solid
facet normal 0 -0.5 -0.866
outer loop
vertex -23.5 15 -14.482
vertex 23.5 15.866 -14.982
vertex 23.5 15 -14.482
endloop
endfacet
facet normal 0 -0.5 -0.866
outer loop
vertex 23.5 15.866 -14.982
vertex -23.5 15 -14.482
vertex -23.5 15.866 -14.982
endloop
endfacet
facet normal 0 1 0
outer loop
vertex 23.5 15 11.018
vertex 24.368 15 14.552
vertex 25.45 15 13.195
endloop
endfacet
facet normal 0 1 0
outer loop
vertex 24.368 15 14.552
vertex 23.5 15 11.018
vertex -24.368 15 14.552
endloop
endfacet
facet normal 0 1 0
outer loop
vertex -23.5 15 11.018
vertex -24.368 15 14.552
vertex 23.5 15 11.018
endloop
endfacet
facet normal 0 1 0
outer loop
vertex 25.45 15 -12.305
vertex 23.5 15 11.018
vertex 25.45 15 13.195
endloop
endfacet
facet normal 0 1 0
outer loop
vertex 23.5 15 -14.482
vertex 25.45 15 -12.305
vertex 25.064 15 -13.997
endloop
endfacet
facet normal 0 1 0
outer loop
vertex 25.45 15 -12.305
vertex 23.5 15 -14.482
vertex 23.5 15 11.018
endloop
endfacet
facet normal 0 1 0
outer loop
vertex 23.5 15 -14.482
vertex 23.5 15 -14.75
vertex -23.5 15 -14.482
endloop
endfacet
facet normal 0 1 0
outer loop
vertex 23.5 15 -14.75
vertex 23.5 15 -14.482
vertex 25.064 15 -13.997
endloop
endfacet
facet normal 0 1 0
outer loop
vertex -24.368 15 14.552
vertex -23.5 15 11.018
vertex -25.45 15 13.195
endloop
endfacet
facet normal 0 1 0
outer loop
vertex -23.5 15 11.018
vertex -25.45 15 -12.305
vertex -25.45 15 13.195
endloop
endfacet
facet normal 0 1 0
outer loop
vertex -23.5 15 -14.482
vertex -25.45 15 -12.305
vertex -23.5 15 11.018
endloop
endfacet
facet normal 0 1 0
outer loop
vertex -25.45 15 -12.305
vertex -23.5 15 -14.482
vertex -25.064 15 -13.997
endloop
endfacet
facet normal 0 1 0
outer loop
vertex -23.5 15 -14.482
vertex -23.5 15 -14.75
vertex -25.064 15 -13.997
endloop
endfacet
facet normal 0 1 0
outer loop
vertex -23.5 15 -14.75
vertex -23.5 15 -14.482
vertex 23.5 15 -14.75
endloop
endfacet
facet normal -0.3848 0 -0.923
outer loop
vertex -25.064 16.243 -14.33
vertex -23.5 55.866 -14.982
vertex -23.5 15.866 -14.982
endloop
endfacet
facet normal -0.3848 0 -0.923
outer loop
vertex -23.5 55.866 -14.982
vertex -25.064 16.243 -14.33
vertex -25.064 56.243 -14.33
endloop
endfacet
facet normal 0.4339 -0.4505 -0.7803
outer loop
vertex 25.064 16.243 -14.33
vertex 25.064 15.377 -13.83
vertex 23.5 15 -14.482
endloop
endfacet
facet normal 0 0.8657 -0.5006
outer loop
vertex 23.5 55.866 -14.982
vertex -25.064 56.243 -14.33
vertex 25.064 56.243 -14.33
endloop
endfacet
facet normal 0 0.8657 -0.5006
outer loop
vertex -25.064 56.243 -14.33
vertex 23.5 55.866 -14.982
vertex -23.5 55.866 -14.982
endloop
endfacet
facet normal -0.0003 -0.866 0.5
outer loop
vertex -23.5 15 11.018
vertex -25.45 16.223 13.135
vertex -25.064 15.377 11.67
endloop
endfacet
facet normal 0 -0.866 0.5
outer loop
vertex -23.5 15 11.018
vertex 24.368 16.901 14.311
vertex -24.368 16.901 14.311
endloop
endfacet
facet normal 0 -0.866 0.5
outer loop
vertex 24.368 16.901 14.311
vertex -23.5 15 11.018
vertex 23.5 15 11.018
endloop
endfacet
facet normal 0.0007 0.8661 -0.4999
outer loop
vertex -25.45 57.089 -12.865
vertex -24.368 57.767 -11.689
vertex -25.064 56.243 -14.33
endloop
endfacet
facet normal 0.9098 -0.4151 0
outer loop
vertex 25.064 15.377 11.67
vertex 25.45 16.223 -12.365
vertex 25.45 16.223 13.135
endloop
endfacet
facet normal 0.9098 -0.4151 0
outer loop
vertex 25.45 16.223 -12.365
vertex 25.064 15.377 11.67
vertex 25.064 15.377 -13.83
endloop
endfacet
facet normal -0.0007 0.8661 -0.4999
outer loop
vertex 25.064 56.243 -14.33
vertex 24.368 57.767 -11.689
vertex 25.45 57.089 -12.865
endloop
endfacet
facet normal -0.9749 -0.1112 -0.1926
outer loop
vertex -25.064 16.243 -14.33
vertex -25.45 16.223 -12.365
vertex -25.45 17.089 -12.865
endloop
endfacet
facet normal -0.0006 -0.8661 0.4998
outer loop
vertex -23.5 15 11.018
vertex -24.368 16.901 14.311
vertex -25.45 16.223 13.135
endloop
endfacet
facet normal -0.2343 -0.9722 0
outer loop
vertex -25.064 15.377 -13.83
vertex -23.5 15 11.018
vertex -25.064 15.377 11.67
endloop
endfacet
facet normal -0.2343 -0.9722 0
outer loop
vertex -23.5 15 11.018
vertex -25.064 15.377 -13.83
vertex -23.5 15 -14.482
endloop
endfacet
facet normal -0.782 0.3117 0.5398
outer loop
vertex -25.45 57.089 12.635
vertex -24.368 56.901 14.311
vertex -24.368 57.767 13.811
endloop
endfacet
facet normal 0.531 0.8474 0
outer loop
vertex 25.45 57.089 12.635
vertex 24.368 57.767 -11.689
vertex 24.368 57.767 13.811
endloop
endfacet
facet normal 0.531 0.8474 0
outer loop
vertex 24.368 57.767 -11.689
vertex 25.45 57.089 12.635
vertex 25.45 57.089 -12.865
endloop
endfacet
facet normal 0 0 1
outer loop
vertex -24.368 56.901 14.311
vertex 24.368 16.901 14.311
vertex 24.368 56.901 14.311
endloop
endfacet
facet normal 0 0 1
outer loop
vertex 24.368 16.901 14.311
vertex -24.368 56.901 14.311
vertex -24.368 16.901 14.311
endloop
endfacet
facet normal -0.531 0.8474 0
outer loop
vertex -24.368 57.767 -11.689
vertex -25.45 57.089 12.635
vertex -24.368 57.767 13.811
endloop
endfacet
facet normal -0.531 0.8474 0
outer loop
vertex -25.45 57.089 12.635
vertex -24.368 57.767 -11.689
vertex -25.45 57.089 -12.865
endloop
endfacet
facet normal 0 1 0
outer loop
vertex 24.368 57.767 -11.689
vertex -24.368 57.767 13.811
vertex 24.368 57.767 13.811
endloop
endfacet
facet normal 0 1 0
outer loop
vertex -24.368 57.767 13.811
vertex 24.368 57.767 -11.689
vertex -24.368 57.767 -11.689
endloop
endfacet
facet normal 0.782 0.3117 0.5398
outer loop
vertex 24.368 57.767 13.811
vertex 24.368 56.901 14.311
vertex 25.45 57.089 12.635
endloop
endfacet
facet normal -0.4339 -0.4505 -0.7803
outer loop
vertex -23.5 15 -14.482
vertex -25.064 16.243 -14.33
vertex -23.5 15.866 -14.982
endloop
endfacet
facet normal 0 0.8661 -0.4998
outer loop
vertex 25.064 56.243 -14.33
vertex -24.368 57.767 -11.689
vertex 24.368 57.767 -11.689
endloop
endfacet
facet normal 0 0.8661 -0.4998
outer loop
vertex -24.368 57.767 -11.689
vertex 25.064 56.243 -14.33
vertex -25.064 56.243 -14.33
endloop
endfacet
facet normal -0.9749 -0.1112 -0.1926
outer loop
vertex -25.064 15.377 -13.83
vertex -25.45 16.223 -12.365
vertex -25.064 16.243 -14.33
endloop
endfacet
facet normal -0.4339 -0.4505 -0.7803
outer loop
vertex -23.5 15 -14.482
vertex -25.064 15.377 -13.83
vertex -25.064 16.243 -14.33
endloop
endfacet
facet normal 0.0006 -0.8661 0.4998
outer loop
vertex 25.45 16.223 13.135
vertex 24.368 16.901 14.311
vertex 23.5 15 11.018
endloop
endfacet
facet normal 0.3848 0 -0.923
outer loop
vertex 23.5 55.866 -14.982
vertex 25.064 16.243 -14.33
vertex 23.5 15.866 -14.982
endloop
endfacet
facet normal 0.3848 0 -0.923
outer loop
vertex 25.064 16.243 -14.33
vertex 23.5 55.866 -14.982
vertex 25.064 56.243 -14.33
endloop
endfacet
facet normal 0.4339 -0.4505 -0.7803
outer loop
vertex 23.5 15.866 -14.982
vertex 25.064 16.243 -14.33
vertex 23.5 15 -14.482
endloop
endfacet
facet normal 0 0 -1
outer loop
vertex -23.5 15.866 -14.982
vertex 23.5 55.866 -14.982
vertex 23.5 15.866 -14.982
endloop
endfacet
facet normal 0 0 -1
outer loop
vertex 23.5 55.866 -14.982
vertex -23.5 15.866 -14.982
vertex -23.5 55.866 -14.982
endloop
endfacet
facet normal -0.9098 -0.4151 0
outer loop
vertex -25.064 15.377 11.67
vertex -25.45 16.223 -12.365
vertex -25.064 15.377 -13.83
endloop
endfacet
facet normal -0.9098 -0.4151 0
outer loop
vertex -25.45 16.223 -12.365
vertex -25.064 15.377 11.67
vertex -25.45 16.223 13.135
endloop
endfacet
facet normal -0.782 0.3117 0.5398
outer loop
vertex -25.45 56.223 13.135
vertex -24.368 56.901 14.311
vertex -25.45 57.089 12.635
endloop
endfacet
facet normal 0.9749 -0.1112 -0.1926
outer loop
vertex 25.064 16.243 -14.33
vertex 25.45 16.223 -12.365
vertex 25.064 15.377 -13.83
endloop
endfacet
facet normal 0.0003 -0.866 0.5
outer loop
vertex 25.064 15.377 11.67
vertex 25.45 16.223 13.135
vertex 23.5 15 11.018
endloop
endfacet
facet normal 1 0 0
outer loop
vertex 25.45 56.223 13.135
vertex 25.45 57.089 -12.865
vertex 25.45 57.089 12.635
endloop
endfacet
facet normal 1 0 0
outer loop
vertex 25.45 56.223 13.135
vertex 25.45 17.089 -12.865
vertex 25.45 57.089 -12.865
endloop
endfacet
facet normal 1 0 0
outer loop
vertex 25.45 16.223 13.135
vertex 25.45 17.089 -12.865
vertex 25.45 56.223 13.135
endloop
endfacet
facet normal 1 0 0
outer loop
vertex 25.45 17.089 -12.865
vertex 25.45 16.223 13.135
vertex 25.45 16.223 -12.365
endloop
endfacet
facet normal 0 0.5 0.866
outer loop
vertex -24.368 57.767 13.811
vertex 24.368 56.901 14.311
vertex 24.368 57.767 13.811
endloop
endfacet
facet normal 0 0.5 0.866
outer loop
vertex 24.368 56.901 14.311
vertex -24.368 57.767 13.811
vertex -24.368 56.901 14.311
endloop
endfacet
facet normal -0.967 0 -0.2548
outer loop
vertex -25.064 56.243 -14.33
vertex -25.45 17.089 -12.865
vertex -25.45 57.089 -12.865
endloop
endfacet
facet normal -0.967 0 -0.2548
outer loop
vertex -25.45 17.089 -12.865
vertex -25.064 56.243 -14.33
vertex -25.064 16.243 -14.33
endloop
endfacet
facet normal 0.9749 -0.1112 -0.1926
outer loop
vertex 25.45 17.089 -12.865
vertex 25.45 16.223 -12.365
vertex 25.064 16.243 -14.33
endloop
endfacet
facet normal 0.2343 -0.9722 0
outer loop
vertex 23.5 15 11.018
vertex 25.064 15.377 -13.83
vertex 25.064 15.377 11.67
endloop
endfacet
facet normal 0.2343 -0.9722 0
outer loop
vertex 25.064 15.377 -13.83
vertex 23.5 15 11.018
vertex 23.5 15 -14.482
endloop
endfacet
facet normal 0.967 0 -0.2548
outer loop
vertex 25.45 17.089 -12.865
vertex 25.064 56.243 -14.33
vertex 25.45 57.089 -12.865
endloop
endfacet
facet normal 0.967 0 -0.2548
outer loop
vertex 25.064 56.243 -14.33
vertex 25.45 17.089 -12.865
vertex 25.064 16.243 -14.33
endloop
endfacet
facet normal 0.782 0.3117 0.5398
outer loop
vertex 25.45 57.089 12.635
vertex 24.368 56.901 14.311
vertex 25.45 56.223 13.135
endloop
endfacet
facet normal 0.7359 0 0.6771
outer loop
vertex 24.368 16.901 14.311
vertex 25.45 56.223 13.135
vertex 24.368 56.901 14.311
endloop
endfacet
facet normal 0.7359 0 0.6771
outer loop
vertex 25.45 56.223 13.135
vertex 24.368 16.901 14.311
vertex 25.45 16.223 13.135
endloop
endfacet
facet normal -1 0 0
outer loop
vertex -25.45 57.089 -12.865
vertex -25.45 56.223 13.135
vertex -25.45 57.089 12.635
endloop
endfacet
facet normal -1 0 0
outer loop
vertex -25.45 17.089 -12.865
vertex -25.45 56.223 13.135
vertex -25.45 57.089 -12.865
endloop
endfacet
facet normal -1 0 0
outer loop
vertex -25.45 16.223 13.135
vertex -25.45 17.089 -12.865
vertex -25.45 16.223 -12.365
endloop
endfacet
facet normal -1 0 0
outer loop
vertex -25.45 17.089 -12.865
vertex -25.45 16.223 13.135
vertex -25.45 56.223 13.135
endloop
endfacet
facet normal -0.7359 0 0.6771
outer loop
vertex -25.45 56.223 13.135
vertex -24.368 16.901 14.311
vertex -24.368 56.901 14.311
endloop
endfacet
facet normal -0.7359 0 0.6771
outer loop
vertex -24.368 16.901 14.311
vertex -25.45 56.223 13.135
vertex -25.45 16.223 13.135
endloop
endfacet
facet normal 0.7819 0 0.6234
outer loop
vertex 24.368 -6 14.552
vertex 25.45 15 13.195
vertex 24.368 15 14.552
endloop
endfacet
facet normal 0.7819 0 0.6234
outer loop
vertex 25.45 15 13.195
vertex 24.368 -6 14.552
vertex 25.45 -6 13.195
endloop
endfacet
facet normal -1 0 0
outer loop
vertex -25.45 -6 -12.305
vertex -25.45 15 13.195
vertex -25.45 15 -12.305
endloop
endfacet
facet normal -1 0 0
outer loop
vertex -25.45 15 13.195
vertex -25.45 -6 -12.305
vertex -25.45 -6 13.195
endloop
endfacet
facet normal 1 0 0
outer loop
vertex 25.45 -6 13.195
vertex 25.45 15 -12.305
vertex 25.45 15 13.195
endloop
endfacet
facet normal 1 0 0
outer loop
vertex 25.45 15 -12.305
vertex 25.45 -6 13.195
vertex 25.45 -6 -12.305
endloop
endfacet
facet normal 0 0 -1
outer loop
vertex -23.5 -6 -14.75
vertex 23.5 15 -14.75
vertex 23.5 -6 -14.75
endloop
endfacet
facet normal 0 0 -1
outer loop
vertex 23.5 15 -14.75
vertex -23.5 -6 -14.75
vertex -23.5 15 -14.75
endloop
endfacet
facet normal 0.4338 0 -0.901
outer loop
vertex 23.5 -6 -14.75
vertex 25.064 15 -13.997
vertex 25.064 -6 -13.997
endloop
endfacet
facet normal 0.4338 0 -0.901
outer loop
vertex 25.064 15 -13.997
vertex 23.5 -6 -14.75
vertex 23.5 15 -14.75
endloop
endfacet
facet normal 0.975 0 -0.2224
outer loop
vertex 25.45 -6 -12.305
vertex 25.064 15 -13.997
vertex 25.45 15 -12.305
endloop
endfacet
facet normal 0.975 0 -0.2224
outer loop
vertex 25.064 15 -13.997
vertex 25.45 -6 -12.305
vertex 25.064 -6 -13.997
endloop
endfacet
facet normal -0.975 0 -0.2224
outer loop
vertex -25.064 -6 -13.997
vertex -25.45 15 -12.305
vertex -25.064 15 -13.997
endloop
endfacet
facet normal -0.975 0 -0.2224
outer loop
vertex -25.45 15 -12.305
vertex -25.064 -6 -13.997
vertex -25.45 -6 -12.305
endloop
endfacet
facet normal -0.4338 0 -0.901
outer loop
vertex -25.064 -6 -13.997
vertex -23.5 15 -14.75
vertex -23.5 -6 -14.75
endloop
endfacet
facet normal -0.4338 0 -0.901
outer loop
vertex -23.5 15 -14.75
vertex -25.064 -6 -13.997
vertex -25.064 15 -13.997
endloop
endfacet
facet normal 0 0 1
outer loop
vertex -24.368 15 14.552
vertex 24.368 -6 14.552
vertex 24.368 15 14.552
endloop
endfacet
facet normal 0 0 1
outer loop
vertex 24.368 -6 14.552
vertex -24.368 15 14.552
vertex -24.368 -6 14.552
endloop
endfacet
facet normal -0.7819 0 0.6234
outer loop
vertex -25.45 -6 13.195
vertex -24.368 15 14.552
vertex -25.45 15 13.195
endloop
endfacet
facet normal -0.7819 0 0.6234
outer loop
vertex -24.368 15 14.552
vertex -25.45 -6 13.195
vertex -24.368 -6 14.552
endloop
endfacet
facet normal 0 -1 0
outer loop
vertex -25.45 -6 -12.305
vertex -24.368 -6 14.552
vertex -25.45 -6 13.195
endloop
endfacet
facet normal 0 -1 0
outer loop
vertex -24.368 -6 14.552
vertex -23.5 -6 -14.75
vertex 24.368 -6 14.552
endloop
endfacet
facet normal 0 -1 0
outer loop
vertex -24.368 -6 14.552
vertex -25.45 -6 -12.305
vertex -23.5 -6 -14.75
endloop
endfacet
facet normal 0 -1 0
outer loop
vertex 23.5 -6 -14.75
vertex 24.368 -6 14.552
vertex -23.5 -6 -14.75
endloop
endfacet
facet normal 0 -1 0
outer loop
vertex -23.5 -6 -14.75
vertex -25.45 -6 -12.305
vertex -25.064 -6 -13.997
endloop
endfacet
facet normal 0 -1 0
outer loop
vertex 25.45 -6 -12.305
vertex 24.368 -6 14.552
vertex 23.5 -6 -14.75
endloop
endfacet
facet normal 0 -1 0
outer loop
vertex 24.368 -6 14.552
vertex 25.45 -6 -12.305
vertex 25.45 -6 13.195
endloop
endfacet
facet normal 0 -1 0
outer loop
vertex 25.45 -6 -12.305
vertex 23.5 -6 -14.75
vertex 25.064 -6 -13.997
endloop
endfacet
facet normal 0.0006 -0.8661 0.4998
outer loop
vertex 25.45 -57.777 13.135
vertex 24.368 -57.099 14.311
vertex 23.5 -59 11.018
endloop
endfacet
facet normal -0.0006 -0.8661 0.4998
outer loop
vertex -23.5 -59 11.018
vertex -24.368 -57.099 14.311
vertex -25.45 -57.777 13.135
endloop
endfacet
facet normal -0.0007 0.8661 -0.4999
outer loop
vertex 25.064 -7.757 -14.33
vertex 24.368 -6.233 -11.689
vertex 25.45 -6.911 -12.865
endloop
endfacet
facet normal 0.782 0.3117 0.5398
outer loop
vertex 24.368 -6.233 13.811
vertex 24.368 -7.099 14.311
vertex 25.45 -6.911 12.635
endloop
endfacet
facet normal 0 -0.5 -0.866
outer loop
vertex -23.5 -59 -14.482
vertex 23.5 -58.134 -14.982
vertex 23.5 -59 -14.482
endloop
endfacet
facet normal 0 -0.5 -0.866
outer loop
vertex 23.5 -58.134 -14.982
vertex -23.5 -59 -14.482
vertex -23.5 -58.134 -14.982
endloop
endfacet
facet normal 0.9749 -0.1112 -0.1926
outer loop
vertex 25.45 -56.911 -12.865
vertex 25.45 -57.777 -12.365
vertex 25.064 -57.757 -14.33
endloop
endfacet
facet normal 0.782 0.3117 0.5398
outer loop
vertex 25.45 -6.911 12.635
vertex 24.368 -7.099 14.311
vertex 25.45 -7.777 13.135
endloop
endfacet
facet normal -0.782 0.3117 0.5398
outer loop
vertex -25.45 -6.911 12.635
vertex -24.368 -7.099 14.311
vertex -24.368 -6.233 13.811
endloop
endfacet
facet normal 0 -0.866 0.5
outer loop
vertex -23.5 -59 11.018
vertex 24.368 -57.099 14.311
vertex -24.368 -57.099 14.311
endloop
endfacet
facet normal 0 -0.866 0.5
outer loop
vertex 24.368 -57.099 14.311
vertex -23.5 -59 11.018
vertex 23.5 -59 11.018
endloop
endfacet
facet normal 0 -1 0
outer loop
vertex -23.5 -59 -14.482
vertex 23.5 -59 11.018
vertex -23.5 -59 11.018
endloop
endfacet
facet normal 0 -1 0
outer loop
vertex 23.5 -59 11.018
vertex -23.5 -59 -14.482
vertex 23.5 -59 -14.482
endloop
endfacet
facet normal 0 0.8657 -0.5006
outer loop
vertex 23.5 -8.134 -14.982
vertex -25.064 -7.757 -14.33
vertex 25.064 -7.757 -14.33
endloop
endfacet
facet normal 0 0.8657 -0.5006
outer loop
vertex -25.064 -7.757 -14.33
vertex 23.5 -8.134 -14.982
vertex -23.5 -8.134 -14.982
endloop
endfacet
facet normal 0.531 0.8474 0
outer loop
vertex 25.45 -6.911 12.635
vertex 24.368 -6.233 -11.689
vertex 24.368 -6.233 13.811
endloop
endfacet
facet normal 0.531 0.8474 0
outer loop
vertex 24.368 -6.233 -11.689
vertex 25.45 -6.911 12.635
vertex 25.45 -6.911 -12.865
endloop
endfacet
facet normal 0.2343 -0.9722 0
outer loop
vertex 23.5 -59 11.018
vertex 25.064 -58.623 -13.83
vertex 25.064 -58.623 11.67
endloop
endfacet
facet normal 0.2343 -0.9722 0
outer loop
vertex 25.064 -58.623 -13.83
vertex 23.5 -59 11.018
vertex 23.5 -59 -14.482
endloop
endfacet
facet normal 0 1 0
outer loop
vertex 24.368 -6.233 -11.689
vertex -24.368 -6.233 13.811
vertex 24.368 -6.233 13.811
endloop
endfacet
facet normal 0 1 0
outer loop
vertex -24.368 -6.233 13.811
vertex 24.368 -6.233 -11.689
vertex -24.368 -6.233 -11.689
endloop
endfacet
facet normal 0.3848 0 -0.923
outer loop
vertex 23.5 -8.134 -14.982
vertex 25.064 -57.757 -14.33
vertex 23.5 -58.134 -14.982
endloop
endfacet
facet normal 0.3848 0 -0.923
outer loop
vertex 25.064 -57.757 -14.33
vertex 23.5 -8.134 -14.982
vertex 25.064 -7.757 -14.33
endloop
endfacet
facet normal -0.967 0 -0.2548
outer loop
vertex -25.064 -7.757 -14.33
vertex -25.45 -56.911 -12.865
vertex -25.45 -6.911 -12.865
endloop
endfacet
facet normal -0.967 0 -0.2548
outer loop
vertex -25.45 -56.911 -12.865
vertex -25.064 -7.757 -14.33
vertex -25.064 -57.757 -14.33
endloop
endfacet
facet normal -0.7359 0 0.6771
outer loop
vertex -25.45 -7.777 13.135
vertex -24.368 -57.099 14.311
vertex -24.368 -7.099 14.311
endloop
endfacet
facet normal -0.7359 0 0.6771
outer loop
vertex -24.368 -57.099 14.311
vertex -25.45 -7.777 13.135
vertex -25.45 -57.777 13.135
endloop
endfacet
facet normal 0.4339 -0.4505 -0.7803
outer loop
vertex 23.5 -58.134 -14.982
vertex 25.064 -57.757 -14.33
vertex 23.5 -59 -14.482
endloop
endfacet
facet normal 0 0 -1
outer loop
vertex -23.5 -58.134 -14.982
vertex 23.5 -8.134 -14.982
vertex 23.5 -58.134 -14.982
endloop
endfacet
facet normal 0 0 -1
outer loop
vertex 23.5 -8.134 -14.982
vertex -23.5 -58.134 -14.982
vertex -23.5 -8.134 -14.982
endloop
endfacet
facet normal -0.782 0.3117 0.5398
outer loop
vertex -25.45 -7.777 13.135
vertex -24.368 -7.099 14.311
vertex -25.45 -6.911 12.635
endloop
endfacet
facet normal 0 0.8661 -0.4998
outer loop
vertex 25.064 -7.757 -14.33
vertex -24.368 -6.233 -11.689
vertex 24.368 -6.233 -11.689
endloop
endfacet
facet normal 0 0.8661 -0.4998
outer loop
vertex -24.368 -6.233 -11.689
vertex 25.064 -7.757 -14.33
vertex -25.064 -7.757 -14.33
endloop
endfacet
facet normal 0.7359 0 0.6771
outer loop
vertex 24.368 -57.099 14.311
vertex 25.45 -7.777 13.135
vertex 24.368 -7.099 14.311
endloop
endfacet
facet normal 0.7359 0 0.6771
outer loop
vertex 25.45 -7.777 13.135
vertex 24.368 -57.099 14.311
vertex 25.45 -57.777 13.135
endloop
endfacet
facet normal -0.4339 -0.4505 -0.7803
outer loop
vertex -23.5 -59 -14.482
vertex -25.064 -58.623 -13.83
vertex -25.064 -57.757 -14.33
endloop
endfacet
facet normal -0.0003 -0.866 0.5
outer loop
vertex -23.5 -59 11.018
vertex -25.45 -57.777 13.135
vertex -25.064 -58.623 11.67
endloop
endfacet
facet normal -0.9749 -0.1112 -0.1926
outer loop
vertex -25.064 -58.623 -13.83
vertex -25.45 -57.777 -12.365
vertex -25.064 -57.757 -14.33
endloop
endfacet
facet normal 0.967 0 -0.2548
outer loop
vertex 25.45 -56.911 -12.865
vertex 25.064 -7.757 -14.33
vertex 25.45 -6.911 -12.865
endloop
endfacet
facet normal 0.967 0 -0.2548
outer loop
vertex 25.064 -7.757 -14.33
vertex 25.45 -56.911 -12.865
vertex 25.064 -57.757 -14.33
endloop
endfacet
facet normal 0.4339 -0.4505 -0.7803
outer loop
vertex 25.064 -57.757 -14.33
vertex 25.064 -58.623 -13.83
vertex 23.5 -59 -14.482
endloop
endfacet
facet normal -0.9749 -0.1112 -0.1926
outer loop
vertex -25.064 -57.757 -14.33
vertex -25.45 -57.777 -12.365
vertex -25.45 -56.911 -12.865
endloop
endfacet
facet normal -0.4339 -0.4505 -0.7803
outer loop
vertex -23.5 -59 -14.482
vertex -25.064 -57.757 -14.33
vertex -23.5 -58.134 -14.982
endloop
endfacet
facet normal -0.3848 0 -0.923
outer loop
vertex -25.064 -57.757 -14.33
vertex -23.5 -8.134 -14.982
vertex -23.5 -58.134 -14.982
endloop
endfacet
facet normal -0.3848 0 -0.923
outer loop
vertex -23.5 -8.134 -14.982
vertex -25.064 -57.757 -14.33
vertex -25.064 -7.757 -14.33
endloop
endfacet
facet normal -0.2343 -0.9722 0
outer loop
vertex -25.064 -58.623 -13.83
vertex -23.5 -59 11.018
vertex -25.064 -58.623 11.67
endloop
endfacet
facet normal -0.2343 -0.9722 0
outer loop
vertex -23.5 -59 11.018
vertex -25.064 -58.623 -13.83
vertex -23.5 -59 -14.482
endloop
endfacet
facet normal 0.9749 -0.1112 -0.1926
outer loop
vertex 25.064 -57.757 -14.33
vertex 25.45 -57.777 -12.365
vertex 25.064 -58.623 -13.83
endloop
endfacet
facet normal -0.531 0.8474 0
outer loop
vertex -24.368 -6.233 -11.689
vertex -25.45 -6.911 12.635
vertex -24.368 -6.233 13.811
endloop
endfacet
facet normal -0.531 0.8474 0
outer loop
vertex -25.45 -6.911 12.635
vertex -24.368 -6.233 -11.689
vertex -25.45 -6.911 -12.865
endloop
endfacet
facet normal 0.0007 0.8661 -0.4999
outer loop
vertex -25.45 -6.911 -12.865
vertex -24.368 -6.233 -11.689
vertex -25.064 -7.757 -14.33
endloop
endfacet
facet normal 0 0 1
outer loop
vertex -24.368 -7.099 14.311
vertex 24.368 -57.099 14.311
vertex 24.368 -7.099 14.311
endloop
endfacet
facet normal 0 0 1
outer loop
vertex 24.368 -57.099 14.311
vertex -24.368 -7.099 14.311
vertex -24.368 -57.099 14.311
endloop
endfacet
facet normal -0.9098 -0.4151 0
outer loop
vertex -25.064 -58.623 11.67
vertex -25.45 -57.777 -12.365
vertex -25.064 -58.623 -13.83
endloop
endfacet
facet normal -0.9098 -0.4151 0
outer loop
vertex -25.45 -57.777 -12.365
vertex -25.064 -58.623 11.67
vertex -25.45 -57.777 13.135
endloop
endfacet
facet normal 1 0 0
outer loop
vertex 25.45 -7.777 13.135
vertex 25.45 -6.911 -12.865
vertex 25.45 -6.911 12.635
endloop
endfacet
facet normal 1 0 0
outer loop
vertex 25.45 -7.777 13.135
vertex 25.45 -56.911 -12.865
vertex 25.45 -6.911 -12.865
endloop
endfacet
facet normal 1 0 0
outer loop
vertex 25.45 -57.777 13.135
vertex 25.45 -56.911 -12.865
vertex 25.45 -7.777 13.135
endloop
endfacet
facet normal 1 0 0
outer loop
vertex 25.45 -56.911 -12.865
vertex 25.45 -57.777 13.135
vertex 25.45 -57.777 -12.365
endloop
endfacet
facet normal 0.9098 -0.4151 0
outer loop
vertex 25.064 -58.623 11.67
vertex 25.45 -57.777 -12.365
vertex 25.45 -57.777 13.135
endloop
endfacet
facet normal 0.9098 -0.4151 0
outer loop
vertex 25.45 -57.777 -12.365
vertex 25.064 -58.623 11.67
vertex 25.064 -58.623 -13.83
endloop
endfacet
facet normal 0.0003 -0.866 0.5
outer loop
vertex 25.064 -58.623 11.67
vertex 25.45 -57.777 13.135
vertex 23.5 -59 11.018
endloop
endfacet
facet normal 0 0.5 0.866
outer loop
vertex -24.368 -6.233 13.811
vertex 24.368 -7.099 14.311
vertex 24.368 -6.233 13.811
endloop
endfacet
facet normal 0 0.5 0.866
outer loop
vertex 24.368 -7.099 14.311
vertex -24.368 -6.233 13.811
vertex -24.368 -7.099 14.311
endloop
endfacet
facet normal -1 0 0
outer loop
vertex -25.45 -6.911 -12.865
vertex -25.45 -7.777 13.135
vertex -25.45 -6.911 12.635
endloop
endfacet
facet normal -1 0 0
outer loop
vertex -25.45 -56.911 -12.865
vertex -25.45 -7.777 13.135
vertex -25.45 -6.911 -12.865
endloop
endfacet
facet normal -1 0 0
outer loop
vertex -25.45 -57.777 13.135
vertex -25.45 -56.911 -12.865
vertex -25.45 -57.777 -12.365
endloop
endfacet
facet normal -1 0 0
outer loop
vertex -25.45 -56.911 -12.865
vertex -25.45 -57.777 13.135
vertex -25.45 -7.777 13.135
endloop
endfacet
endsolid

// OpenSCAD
// Laser measure recreation
// John Bargman & Colin 2020-11-19

// All measurements in millimeters

width=25.5;
depth=47;
Top_height=40;
Bottom_height=20;
Middlepart_height=50;

//cube([width,depth,height], center)

module Laser_Measure()


{
    origin = [0,0,0];
    origin_rotation = [0,90,90];

    translate(origin)
    {
        rotate(origin_rotation)
        {
            translate([0,0,36]){
            minkowski(){
            cube([width,depth,Top_height], center = true); 
              rotate([0,30,0]){
                cylinder(r=2,h=1);
                      
              }
            }
        }
        translate([0,0,4]){
           minkowski() {
            cube([width,depth,Bottom_height], center = true); 
              cylinder(r=2,h=1);
           }
       }
            translate([0,0,-33]){
          minkowski(){  
            cube([width,depth,Middlepart_height], center = true); 
              rotate([0,30,0]){
              cylinder(r=2,h=1);
          }
      }
  }
           // #cube([29,51,116], center = true);   
  
            

        }
    }
}

Laser_Measure();
